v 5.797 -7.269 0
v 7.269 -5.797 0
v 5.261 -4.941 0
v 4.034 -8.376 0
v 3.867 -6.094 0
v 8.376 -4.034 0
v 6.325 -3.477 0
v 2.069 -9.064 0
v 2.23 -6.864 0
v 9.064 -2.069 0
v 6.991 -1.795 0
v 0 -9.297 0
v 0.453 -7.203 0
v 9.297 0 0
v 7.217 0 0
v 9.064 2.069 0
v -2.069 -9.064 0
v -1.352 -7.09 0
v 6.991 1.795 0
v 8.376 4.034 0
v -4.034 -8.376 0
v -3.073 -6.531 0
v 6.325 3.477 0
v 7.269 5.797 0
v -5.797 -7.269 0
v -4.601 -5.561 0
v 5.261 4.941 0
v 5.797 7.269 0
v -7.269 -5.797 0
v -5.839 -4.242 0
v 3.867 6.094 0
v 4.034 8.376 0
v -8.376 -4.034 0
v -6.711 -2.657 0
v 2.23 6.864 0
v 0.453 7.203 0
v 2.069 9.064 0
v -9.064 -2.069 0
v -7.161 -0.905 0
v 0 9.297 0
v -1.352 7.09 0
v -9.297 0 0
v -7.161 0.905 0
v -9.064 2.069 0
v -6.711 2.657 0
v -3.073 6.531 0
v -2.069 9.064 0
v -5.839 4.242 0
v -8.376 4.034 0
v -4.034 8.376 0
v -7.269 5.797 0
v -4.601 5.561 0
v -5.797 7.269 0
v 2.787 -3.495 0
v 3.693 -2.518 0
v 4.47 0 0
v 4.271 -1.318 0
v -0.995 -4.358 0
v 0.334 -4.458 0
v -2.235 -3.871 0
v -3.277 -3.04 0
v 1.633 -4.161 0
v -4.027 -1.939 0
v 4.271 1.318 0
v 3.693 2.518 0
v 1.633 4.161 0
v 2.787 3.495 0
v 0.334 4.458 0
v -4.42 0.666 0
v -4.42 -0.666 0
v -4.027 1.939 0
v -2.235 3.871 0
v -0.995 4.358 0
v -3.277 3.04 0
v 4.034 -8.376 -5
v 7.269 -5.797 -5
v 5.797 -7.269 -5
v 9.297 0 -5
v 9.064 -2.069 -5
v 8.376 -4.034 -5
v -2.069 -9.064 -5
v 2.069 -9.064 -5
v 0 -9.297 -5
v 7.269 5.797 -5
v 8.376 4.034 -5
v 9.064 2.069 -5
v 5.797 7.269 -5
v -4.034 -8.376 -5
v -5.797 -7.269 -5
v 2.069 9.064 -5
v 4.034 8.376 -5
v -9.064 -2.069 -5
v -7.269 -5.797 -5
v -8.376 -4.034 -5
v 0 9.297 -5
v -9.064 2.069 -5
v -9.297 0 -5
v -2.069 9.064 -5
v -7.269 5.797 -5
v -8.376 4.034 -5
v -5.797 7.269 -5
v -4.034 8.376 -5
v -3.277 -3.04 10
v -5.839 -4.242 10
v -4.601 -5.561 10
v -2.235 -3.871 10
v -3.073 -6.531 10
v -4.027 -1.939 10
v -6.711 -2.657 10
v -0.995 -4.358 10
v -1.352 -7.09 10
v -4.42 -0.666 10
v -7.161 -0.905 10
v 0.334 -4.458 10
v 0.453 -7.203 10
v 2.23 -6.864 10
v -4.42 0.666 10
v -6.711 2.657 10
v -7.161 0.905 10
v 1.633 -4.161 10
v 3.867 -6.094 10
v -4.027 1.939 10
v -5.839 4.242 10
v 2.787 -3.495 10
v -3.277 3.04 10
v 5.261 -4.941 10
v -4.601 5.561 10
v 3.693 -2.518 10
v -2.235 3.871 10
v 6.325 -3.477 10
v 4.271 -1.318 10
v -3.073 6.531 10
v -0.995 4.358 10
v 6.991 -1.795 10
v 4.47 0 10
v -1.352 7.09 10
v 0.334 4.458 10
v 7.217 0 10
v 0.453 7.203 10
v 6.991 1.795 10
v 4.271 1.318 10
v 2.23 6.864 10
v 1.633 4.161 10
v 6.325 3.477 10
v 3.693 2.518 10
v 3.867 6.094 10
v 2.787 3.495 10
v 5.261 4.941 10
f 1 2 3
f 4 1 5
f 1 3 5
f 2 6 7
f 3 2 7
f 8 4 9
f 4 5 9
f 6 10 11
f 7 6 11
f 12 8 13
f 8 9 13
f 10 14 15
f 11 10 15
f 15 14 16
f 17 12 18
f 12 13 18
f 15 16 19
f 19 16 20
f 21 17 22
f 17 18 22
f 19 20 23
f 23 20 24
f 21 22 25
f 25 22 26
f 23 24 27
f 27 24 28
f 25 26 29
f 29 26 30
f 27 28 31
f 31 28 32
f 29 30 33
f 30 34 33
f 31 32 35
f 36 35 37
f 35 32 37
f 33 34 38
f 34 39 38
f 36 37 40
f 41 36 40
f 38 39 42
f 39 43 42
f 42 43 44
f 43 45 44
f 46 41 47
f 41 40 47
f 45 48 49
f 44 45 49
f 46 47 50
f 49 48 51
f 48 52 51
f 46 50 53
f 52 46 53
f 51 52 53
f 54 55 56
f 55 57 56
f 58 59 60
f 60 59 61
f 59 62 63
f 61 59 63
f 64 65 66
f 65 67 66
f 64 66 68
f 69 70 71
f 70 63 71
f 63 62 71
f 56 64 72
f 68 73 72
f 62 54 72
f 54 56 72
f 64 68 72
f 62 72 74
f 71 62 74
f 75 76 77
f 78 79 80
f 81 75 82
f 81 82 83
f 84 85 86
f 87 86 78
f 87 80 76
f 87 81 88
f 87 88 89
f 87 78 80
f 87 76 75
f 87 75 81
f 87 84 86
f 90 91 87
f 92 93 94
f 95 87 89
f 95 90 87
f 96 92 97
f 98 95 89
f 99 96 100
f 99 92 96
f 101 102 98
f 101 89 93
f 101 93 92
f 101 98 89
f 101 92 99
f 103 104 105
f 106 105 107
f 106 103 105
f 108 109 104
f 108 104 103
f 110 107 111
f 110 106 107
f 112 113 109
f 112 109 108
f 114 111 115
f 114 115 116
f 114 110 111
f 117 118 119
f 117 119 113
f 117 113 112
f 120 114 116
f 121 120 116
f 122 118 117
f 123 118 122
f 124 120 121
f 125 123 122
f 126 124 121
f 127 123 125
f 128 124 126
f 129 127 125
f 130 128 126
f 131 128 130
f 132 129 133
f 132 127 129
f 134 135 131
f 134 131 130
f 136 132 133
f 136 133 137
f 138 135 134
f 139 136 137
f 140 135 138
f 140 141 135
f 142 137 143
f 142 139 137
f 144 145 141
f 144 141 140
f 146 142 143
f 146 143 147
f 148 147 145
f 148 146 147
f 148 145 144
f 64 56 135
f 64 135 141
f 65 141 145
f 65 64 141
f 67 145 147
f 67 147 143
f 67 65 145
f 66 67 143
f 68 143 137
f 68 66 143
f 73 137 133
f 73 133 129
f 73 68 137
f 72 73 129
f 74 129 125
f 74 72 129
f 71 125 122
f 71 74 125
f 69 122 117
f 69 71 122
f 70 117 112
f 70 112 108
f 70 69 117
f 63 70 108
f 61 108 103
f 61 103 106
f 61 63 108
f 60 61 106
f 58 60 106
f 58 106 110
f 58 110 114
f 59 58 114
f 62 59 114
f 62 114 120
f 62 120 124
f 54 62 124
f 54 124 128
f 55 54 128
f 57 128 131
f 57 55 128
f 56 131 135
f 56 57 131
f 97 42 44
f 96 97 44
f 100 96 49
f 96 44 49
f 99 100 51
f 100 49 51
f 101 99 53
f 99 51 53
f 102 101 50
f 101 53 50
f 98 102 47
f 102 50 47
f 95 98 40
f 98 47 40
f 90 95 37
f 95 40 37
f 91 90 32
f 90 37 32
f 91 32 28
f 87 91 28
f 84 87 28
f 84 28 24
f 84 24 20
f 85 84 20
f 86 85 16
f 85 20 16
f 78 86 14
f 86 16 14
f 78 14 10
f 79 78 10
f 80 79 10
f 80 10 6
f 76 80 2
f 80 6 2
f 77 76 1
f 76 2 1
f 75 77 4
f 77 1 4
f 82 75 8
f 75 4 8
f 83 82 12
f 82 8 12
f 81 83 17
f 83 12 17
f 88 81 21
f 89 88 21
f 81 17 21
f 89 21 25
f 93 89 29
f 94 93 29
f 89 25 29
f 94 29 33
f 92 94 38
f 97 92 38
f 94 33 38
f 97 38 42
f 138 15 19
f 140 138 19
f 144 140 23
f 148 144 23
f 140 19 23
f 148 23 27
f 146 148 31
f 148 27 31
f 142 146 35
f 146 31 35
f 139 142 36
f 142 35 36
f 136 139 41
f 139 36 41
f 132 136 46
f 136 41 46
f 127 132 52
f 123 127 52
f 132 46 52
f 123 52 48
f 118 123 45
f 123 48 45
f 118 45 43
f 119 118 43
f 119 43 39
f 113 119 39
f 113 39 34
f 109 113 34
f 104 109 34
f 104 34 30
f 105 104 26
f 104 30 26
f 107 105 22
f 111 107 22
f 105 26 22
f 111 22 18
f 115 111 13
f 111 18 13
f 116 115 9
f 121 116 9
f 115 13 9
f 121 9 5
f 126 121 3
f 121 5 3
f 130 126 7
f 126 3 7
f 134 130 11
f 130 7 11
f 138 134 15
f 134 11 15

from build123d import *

# Parameters (mm, degrees)
SKETCH1_R           = 7.217490794
SKETCH1_R_2         = 4.47
BOSS_EXTRUDE1_DEPTH = 10
SKETCH2_R           = 9.29699824
BOSS_EXTRUDE2_DEPTH = 5


with BuildPart() as part:
    # Sketch1 → Boss-Extrude1 (new body)
    with BuildSketch(Plane.XY):
        Circle(SKETCH1_R)
        Circle(SKETCH1_R_2, mode=Mode.SUBTRACT)
    extrude(amount=BOSS_EXTRUDE1_DEPTH)

    # Sketch2 → Boss-Extrude2 (add)
    with BuildSketch(Plane(origin=(0, 0, 0), x_dir=(-1, 0, 0), z_dir=(0, 0, -1))):
        Circle(SKETCH2_R)
    extrude(amount=BOSS_EXTRUDE2_DEPTH)


solid = part.part
